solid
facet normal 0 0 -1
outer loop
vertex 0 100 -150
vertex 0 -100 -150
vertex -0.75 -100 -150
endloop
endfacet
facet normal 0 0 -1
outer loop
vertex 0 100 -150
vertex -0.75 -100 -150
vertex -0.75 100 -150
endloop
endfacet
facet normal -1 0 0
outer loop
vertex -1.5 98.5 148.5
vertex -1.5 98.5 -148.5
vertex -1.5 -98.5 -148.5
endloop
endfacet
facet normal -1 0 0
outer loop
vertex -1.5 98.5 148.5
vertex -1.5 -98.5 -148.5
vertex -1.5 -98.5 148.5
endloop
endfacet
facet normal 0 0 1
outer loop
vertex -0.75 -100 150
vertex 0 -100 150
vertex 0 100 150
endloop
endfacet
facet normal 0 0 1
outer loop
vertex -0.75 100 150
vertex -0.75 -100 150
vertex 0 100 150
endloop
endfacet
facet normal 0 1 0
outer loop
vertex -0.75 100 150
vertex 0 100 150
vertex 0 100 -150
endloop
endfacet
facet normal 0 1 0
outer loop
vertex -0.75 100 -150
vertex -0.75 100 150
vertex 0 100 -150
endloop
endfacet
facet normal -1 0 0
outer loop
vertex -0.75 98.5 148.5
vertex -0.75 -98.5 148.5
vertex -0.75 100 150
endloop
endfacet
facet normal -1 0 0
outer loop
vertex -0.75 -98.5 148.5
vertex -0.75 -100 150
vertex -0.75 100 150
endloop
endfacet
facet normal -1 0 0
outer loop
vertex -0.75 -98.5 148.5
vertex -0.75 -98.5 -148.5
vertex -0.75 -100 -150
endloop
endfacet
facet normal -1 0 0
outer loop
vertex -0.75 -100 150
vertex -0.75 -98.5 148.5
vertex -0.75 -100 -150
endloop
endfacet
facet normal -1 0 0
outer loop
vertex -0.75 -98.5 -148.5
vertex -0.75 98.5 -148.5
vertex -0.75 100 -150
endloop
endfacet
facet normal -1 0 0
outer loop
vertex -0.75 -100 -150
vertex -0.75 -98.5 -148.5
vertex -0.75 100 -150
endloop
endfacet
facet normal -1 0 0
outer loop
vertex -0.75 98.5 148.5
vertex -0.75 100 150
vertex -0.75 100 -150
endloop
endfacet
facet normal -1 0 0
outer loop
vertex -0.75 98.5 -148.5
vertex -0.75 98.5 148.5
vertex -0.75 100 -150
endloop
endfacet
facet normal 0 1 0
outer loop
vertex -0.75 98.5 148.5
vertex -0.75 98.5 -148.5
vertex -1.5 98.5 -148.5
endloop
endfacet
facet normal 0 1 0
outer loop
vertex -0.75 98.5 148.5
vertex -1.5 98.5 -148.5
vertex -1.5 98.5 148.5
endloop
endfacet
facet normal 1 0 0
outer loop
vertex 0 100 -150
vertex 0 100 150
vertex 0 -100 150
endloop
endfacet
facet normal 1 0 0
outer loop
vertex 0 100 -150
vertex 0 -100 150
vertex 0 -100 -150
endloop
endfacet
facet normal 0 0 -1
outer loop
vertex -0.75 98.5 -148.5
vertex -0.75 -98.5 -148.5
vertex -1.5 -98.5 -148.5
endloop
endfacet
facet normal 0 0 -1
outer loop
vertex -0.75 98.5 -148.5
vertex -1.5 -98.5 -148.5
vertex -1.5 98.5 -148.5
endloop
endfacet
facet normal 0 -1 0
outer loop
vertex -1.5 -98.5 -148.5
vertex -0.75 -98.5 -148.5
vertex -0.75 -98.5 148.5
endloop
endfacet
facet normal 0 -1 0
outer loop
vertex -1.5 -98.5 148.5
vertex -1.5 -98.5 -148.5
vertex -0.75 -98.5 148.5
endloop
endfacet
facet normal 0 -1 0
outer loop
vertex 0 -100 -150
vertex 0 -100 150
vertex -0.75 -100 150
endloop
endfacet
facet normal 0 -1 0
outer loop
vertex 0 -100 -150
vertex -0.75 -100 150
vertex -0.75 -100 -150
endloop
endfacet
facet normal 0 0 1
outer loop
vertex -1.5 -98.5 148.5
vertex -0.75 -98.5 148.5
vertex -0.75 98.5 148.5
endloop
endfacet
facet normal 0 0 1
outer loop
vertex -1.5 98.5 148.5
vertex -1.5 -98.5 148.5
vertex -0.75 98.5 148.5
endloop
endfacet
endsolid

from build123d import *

# Parameters (mm, degrees)
SKETCH_1_W      = 300
SKETCH_1_H      = 200
EXTRUDE_1_DEPTH = 0.75
SKETCH_2_W      = 297
SKETCH_2_H      = 197
EXTRUDE_2_DEPTH = 0.75


with BuildPart() as part:
    # Эскиз1 → Бобышка-Вытянуть1 (new body)
    with BuildSketch(Plane(origin=(0, 0, 0), x_dir=(0, 0, -1), z_dir=(1, 0, 0))):
        Rectangle(SKETCH_1_W, SKETCH_1_H)
    extrude(amount=-EXTRUDE_1_DEPTH)

    # Эскиз2 → Бобышка-Вытянуть2 (add)
    with BuildSketch(Plane.ZY.offset(0.75)):
        Rectangle(SKETCH_2_W, SKETCH_2_H)
    extrude(amount=EXTRUDE_2_DEPTH)


solid = part.part
